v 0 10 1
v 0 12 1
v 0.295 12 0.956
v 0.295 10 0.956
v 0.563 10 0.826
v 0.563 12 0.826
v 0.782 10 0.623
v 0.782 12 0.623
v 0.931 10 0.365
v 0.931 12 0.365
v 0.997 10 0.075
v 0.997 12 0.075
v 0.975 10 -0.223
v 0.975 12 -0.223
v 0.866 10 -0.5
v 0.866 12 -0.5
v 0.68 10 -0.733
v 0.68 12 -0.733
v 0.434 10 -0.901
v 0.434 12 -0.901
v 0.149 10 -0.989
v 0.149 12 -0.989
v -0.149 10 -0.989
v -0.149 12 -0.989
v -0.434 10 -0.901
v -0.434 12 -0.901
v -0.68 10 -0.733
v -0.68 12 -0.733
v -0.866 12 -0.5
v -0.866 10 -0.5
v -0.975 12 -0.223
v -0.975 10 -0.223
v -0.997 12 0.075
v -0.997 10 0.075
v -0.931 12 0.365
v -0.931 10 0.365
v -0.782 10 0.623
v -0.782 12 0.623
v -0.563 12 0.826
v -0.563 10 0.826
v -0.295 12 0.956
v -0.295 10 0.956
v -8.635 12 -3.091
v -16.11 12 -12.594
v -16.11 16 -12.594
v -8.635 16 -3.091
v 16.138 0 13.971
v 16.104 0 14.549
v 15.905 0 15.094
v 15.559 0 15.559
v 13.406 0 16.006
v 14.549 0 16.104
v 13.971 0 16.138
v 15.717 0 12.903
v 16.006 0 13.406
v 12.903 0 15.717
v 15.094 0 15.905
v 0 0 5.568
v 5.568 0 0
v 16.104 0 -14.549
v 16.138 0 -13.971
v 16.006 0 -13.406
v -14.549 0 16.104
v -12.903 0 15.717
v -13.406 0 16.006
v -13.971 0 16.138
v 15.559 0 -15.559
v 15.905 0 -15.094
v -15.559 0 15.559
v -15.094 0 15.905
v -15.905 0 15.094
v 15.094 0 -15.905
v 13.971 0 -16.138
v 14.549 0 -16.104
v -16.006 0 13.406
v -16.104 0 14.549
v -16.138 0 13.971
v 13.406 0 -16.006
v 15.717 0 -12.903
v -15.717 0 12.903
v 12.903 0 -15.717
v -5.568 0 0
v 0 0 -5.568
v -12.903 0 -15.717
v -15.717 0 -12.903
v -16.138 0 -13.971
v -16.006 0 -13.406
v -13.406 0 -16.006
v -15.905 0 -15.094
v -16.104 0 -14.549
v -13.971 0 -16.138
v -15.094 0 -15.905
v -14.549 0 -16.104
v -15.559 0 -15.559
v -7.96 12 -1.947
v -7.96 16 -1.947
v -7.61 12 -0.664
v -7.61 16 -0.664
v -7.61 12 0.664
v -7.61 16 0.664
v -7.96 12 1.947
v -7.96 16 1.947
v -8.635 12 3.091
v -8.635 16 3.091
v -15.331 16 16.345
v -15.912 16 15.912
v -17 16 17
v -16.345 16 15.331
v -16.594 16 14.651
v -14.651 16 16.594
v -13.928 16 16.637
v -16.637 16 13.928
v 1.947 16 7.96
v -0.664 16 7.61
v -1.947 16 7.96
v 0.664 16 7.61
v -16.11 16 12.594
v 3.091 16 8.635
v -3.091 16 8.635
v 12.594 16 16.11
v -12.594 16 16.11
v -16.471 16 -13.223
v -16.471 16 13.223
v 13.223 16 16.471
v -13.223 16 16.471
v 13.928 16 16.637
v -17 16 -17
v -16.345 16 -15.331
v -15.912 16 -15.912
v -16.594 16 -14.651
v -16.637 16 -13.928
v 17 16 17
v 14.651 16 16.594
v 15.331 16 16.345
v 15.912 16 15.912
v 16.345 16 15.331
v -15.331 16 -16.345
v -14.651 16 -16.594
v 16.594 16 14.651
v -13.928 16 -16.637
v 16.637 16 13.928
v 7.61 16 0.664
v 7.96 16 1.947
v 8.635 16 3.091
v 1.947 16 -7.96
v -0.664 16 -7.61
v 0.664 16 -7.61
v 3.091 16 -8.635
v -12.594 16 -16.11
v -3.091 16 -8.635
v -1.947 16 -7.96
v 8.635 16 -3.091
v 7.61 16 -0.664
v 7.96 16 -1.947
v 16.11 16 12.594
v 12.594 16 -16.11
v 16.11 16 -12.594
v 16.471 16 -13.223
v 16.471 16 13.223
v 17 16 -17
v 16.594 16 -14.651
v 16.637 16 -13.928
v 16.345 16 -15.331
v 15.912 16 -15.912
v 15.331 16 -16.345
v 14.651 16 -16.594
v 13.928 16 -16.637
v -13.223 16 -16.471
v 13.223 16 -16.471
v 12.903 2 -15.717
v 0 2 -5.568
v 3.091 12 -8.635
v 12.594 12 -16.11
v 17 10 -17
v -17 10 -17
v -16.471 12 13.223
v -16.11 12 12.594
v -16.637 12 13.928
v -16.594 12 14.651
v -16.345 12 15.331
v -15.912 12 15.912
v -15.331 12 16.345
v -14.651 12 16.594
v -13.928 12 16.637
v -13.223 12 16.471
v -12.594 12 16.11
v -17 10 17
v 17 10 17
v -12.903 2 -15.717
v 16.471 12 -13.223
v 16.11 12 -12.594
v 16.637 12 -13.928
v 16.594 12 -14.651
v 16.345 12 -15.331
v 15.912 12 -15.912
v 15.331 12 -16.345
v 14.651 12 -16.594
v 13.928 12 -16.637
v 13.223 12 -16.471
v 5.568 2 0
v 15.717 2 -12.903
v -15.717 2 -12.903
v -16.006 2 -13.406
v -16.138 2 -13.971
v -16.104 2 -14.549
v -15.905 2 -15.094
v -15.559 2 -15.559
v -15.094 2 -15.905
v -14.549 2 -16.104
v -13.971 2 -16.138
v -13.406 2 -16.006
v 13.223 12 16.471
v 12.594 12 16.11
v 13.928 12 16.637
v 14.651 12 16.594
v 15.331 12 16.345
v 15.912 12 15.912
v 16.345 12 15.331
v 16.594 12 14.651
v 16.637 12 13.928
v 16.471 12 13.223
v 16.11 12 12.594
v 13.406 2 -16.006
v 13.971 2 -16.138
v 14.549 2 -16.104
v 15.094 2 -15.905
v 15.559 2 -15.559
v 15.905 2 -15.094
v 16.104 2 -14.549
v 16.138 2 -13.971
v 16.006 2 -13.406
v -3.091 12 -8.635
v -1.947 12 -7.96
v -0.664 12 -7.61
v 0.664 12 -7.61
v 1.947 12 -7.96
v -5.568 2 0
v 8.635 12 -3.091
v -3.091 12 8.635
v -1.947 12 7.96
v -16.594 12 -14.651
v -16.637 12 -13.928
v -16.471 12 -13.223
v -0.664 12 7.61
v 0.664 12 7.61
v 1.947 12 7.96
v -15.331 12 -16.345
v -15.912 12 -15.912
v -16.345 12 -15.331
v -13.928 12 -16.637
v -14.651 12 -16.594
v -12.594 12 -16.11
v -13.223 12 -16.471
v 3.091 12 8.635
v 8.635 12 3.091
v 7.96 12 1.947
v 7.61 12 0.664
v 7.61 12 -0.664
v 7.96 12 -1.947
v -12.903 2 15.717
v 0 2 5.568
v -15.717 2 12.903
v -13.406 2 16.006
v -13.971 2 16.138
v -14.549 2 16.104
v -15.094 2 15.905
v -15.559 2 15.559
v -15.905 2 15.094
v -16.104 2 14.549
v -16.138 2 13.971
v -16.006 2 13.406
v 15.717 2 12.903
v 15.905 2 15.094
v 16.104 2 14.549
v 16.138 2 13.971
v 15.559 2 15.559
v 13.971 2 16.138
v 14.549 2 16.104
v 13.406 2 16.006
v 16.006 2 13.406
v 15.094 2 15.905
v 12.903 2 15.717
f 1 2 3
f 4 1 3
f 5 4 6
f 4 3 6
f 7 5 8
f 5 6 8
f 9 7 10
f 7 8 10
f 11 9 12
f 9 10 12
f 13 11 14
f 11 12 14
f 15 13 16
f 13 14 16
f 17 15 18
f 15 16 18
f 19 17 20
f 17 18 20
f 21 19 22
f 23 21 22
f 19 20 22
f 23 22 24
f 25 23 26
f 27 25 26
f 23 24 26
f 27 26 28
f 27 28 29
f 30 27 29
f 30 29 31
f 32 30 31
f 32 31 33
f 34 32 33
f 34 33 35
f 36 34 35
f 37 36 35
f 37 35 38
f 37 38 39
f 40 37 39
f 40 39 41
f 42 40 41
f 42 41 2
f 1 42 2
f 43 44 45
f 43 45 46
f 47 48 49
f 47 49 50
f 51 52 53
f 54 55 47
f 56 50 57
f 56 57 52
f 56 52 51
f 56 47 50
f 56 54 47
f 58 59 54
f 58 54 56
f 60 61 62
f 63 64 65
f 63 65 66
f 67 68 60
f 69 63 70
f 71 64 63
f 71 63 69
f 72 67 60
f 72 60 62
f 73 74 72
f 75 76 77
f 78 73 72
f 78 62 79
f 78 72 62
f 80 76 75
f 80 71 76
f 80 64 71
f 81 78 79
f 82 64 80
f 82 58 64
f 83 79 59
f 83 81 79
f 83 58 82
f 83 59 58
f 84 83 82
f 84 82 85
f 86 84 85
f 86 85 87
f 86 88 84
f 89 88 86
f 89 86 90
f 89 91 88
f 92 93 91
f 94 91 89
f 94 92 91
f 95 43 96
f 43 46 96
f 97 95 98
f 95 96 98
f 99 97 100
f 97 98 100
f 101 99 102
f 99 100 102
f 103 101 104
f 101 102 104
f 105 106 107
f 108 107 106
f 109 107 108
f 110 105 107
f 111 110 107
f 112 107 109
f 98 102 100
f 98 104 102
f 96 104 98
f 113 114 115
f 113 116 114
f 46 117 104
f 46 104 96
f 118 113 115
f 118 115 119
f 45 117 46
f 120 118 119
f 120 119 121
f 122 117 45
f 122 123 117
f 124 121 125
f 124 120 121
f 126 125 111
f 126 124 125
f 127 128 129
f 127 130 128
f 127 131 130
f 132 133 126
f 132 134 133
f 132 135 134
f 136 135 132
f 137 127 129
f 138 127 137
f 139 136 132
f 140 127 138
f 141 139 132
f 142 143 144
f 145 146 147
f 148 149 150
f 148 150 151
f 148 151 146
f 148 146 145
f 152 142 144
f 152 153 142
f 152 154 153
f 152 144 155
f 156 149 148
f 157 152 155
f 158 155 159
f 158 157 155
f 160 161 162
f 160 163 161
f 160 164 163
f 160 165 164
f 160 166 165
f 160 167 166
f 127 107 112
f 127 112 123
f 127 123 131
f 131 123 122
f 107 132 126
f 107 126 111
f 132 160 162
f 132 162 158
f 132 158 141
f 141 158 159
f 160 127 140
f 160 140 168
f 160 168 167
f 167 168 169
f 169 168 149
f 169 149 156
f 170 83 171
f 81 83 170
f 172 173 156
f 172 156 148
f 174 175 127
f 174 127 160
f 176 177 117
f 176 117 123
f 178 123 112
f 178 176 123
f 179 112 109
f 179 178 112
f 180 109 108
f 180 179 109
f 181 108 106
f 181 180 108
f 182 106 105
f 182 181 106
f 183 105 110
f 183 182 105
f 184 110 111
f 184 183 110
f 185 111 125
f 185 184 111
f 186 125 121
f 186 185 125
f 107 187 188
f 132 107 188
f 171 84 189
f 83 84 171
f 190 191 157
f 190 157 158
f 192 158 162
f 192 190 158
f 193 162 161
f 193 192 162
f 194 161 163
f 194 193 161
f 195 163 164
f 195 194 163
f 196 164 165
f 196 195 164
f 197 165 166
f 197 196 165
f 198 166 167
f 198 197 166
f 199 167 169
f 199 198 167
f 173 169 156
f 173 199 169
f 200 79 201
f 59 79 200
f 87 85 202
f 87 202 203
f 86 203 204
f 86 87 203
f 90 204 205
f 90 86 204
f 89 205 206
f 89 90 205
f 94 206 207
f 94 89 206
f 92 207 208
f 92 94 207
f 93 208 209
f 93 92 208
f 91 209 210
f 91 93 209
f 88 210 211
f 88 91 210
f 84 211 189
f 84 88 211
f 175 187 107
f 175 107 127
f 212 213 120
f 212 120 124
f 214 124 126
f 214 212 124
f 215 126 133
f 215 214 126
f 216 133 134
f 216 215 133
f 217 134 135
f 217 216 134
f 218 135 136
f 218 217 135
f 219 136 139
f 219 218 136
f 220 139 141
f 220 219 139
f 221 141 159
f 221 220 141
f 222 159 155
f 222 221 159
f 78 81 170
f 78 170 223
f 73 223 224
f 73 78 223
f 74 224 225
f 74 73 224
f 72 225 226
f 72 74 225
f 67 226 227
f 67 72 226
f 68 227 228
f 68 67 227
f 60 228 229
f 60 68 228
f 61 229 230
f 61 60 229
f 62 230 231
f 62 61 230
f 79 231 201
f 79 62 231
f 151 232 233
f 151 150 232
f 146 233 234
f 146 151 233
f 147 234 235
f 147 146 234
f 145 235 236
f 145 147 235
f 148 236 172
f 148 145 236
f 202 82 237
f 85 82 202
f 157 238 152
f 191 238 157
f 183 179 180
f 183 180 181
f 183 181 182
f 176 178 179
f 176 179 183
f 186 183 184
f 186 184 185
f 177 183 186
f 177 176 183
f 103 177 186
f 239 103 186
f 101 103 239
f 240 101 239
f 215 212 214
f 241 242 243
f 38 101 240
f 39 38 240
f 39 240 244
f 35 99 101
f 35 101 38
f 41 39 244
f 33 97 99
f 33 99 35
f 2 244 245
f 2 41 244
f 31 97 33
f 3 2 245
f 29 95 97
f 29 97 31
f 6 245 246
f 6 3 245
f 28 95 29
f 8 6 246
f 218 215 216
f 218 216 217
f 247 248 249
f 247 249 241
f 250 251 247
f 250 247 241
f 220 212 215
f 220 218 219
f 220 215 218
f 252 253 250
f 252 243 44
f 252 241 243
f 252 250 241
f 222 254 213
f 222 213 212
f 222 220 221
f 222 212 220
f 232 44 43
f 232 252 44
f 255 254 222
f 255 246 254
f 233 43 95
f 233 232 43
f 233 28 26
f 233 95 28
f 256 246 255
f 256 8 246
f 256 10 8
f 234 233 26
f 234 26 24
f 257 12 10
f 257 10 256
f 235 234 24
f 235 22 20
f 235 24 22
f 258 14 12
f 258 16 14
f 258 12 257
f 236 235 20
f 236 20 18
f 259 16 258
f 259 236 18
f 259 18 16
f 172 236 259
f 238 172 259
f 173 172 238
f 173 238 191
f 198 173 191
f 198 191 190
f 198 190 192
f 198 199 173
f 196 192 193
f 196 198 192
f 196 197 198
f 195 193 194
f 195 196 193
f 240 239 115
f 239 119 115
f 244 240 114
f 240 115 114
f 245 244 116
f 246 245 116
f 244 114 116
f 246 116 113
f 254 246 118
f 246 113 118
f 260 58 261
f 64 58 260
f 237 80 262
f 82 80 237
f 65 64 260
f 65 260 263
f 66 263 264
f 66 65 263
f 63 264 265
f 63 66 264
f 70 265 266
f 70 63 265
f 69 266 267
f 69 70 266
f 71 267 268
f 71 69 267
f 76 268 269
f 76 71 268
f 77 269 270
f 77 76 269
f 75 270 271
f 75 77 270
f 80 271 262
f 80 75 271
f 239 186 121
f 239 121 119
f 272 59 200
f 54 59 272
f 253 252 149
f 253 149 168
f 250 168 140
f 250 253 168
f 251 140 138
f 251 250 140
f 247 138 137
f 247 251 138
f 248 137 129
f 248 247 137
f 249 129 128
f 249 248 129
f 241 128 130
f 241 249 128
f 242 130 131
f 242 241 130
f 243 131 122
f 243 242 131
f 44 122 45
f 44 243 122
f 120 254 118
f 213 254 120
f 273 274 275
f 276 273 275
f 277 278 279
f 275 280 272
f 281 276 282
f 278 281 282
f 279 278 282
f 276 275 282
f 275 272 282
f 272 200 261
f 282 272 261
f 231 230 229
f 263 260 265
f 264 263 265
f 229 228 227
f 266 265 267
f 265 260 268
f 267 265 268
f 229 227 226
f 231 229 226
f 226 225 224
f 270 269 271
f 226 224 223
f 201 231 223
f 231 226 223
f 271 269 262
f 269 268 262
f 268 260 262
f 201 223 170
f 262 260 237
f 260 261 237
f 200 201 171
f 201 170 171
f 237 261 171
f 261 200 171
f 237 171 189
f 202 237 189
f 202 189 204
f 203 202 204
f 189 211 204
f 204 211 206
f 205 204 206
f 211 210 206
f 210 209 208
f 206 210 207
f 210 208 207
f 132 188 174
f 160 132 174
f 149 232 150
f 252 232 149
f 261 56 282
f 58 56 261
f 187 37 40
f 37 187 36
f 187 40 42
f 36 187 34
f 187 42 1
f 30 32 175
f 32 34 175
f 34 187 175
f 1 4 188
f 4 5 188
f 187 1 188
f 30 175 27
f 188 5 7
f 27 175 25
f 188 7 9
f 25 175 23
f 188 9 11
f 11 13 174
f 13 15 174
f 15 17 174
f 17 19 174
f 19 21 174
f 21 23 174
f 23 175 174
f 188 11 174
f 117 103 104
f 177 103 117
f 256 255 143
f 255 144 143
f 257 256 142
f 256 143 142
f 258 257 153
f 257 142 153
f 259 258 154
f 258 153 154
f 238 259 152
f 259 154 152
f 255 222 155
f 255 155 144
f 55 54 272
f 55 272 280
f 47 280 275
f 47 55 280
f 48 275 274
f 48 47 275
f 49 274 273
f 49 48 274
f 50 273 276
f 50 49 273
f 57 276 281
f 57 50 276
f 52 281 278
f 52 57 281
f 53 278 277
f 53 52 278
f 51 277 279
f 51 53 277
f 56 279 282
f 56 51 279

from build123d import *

# Parameters (mm, degrees)
BOSS_EXTRUDE2_DEPTH = 2
SKETCH2_W           = 34
SKETCH2_H           = 34
BOSS_EXTRUDE3_DEPTH = 6
CUT_EXTRUDE1_START  = -4
CUT_EXTRUDE1_DEPTH  = 4
FILLET1_R           = 5
SKETCH4_R           = 1
CUT_EXTRUDE2_DEPTH  = 10


with BuildPart() as part:
    # Sketch1 → Boss-Extrude2 (new body)
    with BuildSketch(Plane(origin=(0, 0, 0), x_dir=(1, 0, 0), z_dir=(0, 1, 0))):
        with BuildLine():
            Line((0, 5.568191949), (12.90346414, 15.717013375))
            ThreePointArc((12.90346414, 15.717013375), (15.558918419, 15.558918419), (15.717013375, 12.90346414))
            Line((15.717013375, 12.90346414), (5.568191949, 0))
            Line((5.568191949, 0), (15.717013375, -12.90346414))
            ThreePointArc((15.717013375, -12.90346414), (15.558918419, -15.558918419), (12.90346414, -15.717013375))
            Line((12.90346414, -15.717013375), (0, -5.568191949))
            Line((0, -5.568191949), (-12.90346414, -15.717013375))
            ThreePointArc((-12.90346414, -15.717013375), (-15.558918419, -15.558918419), (-15.717013375, -12.90346414))
            Line((-15.717013375, -12.90346414), (-5.568191949, 0))
            Line((-5.568191949, 0), (-15.717013375, 12.90346414))
            ThreePointArc((-15.717013375, 12.90346414), (-15.558918419, 15.558918419), (-12.90346414, 15.717013375))
            Line((-12.90346414, 15.717013375), (0, 5.568191949))
        make_face()
    extrude(amount=BOSS_EXTRUDE2_DEPTH)


with BuildPart() as body_2:
    # Sketch2 → Boss-Extrude3 (new body)
    with BuildSketch(Plane(origin=(0, 10, 0), x_dir=(1, 0, 0), z_dir=(0, 1, 0))):
        Rectangle(SKETCH2_W, SKETCH2_H)
    extrude(amount=BOSS_EXTRUDE3_DEPTH)

    # Sketch3 → Cut-Extrude1 (cut)
    # profile 1 of 2: a face of its own
    with BuildSketch(Plane(origin=(0, 16, 0), x_dir=(1, 0, 0), z_dir=(0, 1, 0)).offset(CUT_EXTRUDE1_START)):
        with BuildLine():
            Line((0, 6.204315433), (-12.59435783, 16.110018832))
            ThreePointArc((-12.59435783, 16.110018832), (-15.912471809, 15.912471809), (-16.110018832, 12.59435783))
            Line((-16.110018832, 12.59435783), (-6.204315433, 0))
            Line((-6.204315433, 0), (-16.110018832, -12.59435783))
            ThreePointArc((-16.110018832, -12.59435783), (-15.912471809, -15.912471809), (-12.59435783, -16.110018832))
            Line((-12.59435783, -16.110018832), (0, -6.204315433))
            Line((0, -6.204315433), (12.59435783, -16.110018832))
            ThreePointArc((12.59435783, -16.110018832), (15.912471809, -15.912471809), (16.110018832, -12.59435783))
            Line((16.110018832, -12.59435783), (6.204315433, 0))
            Line((6.204315433, 0), (16.110018832, 12.59435783))
            ThreePointArc((16.110018832, 12.59435783), (15.912471809, 15.912471809), (12.59435783, 16.110018832))
            Line((12.59435783, 16.110018832), (0, 6.204315433))
        make_face()
        with BuildLine():
            ThreePointArc((-15.717013375, -12.90346414), (-15.558918419, -15.558918419), (-12.90346414, -15.717013375))
            Line((-12.90346414, -15.717013375), (0, -5.568191949))
            Line((0, -5.568191949), (12.90346414, -15.717013375))
            ThreePointArc((12.90346414, -15.717013375), (15.558918419, -15.558918419), (15.717013375, -12.90346414))
            Line((15.717013375, -12.90346414), (5.568191949, 0))
            Line((5.568191949, 0), (15.717013375, 12.90346414))
            ThreePointArc((15.717013375, 12.90346414), (15.558918419, 15.558918419), (12.90346414, 15.717013375))
            Line((12.90346414, 15.717013375), (0, 5.568191949))
            Line((0, 5.568191949), (-12.90346414, 15.717013375))
            ThreePointArc((-12.90346414, 15.717013375), (-15.558918419, 15.558918419), (-15.717013375, 12.90346414))
            Line((-15.717013375, 12.90346414), (-5.568191949, 0))
            Line((-5.568191949, 0), (-15.717013375, -12.90346414))
        make_face(mode=Mode.SUBTRACT)
    # profile 2 of 2: a face of its own
    with BuildSketch(Plane(origin=(0, 16, 0), x_dir=(1, 0, 0), z_dir=(0, 1, 0)).offset(CUT_EXTRUDE1_START)):
        with BuildLine():
            Line((-5.568191949, 0), (-15.717013375, -12.90346414))
            ThreePointArc((-15.717013375, -12.90346414), (-15.558918419, -15.558918419), (-12.90346414, -15.717013375))
            Line((-12.90346414, -15.717013375), (0, -5.568191949))
            Line((0, -5.568191949), (12.90346414, -15.717013375))
            ThreePointArc((12.90346414, -15.717013375), (15.558918419, -15.558918419), (15.717013375, -12.90346414))
            Line((15.717013375, -12.90346414), (5.568191949, 0))
            Line((5.568191949, 0), (15.717013375, 12.90346414))
            ThreePointArc((15.717013375, 12.90346414), (15.558918419, 15.558918419), (12.90346414, 15.717013375))
            Line((12.90346414, 15.717013375), (0, 5.568191949))
            Line((0, 5.568191949), (-12.90346414, 15.717013375))
            ThreePointArc((-12.90346414, 15.717013375), (-15.558918419, 15.558918419), (-15.717013375, 12.90346414))
            Line((-15.717013375, 12.90346414), (-5.568191949, 0))
        make_face()
    extrude(amount=CUT_EXTRUDE1_DEPTH, mode=Mode.SUBTRACT)

    # Fillet1
    fillet1_edges = [body_2.edges().sort_by_distance(p)[0] for p in [
        (0, 14, -6.204315433),
        (6.204315433, 14, 0),
        (0, 14, 6.204315433),
        (-6.204315433, 14, 0),
    ]]
    fillet(fillet1_edges, radius=FILLET1_R)

    # Sketch4 → Cut-Extrude2 (cut)
    with BuildSketch(Plane(origin=(0, 12, 0), x_dir=(1, 0, 0), z_dir=(0, 1, 0))):
        with Locations(Location((0, 0, 0), (0, 0, 270))):
            Circle(SKETCH4_R)
    extrude(amount=-CUT_EXTRUDE2_DEPTH, mode=Mode.SUBTRACT)


solid = Compound([part.part, body_2.part])
